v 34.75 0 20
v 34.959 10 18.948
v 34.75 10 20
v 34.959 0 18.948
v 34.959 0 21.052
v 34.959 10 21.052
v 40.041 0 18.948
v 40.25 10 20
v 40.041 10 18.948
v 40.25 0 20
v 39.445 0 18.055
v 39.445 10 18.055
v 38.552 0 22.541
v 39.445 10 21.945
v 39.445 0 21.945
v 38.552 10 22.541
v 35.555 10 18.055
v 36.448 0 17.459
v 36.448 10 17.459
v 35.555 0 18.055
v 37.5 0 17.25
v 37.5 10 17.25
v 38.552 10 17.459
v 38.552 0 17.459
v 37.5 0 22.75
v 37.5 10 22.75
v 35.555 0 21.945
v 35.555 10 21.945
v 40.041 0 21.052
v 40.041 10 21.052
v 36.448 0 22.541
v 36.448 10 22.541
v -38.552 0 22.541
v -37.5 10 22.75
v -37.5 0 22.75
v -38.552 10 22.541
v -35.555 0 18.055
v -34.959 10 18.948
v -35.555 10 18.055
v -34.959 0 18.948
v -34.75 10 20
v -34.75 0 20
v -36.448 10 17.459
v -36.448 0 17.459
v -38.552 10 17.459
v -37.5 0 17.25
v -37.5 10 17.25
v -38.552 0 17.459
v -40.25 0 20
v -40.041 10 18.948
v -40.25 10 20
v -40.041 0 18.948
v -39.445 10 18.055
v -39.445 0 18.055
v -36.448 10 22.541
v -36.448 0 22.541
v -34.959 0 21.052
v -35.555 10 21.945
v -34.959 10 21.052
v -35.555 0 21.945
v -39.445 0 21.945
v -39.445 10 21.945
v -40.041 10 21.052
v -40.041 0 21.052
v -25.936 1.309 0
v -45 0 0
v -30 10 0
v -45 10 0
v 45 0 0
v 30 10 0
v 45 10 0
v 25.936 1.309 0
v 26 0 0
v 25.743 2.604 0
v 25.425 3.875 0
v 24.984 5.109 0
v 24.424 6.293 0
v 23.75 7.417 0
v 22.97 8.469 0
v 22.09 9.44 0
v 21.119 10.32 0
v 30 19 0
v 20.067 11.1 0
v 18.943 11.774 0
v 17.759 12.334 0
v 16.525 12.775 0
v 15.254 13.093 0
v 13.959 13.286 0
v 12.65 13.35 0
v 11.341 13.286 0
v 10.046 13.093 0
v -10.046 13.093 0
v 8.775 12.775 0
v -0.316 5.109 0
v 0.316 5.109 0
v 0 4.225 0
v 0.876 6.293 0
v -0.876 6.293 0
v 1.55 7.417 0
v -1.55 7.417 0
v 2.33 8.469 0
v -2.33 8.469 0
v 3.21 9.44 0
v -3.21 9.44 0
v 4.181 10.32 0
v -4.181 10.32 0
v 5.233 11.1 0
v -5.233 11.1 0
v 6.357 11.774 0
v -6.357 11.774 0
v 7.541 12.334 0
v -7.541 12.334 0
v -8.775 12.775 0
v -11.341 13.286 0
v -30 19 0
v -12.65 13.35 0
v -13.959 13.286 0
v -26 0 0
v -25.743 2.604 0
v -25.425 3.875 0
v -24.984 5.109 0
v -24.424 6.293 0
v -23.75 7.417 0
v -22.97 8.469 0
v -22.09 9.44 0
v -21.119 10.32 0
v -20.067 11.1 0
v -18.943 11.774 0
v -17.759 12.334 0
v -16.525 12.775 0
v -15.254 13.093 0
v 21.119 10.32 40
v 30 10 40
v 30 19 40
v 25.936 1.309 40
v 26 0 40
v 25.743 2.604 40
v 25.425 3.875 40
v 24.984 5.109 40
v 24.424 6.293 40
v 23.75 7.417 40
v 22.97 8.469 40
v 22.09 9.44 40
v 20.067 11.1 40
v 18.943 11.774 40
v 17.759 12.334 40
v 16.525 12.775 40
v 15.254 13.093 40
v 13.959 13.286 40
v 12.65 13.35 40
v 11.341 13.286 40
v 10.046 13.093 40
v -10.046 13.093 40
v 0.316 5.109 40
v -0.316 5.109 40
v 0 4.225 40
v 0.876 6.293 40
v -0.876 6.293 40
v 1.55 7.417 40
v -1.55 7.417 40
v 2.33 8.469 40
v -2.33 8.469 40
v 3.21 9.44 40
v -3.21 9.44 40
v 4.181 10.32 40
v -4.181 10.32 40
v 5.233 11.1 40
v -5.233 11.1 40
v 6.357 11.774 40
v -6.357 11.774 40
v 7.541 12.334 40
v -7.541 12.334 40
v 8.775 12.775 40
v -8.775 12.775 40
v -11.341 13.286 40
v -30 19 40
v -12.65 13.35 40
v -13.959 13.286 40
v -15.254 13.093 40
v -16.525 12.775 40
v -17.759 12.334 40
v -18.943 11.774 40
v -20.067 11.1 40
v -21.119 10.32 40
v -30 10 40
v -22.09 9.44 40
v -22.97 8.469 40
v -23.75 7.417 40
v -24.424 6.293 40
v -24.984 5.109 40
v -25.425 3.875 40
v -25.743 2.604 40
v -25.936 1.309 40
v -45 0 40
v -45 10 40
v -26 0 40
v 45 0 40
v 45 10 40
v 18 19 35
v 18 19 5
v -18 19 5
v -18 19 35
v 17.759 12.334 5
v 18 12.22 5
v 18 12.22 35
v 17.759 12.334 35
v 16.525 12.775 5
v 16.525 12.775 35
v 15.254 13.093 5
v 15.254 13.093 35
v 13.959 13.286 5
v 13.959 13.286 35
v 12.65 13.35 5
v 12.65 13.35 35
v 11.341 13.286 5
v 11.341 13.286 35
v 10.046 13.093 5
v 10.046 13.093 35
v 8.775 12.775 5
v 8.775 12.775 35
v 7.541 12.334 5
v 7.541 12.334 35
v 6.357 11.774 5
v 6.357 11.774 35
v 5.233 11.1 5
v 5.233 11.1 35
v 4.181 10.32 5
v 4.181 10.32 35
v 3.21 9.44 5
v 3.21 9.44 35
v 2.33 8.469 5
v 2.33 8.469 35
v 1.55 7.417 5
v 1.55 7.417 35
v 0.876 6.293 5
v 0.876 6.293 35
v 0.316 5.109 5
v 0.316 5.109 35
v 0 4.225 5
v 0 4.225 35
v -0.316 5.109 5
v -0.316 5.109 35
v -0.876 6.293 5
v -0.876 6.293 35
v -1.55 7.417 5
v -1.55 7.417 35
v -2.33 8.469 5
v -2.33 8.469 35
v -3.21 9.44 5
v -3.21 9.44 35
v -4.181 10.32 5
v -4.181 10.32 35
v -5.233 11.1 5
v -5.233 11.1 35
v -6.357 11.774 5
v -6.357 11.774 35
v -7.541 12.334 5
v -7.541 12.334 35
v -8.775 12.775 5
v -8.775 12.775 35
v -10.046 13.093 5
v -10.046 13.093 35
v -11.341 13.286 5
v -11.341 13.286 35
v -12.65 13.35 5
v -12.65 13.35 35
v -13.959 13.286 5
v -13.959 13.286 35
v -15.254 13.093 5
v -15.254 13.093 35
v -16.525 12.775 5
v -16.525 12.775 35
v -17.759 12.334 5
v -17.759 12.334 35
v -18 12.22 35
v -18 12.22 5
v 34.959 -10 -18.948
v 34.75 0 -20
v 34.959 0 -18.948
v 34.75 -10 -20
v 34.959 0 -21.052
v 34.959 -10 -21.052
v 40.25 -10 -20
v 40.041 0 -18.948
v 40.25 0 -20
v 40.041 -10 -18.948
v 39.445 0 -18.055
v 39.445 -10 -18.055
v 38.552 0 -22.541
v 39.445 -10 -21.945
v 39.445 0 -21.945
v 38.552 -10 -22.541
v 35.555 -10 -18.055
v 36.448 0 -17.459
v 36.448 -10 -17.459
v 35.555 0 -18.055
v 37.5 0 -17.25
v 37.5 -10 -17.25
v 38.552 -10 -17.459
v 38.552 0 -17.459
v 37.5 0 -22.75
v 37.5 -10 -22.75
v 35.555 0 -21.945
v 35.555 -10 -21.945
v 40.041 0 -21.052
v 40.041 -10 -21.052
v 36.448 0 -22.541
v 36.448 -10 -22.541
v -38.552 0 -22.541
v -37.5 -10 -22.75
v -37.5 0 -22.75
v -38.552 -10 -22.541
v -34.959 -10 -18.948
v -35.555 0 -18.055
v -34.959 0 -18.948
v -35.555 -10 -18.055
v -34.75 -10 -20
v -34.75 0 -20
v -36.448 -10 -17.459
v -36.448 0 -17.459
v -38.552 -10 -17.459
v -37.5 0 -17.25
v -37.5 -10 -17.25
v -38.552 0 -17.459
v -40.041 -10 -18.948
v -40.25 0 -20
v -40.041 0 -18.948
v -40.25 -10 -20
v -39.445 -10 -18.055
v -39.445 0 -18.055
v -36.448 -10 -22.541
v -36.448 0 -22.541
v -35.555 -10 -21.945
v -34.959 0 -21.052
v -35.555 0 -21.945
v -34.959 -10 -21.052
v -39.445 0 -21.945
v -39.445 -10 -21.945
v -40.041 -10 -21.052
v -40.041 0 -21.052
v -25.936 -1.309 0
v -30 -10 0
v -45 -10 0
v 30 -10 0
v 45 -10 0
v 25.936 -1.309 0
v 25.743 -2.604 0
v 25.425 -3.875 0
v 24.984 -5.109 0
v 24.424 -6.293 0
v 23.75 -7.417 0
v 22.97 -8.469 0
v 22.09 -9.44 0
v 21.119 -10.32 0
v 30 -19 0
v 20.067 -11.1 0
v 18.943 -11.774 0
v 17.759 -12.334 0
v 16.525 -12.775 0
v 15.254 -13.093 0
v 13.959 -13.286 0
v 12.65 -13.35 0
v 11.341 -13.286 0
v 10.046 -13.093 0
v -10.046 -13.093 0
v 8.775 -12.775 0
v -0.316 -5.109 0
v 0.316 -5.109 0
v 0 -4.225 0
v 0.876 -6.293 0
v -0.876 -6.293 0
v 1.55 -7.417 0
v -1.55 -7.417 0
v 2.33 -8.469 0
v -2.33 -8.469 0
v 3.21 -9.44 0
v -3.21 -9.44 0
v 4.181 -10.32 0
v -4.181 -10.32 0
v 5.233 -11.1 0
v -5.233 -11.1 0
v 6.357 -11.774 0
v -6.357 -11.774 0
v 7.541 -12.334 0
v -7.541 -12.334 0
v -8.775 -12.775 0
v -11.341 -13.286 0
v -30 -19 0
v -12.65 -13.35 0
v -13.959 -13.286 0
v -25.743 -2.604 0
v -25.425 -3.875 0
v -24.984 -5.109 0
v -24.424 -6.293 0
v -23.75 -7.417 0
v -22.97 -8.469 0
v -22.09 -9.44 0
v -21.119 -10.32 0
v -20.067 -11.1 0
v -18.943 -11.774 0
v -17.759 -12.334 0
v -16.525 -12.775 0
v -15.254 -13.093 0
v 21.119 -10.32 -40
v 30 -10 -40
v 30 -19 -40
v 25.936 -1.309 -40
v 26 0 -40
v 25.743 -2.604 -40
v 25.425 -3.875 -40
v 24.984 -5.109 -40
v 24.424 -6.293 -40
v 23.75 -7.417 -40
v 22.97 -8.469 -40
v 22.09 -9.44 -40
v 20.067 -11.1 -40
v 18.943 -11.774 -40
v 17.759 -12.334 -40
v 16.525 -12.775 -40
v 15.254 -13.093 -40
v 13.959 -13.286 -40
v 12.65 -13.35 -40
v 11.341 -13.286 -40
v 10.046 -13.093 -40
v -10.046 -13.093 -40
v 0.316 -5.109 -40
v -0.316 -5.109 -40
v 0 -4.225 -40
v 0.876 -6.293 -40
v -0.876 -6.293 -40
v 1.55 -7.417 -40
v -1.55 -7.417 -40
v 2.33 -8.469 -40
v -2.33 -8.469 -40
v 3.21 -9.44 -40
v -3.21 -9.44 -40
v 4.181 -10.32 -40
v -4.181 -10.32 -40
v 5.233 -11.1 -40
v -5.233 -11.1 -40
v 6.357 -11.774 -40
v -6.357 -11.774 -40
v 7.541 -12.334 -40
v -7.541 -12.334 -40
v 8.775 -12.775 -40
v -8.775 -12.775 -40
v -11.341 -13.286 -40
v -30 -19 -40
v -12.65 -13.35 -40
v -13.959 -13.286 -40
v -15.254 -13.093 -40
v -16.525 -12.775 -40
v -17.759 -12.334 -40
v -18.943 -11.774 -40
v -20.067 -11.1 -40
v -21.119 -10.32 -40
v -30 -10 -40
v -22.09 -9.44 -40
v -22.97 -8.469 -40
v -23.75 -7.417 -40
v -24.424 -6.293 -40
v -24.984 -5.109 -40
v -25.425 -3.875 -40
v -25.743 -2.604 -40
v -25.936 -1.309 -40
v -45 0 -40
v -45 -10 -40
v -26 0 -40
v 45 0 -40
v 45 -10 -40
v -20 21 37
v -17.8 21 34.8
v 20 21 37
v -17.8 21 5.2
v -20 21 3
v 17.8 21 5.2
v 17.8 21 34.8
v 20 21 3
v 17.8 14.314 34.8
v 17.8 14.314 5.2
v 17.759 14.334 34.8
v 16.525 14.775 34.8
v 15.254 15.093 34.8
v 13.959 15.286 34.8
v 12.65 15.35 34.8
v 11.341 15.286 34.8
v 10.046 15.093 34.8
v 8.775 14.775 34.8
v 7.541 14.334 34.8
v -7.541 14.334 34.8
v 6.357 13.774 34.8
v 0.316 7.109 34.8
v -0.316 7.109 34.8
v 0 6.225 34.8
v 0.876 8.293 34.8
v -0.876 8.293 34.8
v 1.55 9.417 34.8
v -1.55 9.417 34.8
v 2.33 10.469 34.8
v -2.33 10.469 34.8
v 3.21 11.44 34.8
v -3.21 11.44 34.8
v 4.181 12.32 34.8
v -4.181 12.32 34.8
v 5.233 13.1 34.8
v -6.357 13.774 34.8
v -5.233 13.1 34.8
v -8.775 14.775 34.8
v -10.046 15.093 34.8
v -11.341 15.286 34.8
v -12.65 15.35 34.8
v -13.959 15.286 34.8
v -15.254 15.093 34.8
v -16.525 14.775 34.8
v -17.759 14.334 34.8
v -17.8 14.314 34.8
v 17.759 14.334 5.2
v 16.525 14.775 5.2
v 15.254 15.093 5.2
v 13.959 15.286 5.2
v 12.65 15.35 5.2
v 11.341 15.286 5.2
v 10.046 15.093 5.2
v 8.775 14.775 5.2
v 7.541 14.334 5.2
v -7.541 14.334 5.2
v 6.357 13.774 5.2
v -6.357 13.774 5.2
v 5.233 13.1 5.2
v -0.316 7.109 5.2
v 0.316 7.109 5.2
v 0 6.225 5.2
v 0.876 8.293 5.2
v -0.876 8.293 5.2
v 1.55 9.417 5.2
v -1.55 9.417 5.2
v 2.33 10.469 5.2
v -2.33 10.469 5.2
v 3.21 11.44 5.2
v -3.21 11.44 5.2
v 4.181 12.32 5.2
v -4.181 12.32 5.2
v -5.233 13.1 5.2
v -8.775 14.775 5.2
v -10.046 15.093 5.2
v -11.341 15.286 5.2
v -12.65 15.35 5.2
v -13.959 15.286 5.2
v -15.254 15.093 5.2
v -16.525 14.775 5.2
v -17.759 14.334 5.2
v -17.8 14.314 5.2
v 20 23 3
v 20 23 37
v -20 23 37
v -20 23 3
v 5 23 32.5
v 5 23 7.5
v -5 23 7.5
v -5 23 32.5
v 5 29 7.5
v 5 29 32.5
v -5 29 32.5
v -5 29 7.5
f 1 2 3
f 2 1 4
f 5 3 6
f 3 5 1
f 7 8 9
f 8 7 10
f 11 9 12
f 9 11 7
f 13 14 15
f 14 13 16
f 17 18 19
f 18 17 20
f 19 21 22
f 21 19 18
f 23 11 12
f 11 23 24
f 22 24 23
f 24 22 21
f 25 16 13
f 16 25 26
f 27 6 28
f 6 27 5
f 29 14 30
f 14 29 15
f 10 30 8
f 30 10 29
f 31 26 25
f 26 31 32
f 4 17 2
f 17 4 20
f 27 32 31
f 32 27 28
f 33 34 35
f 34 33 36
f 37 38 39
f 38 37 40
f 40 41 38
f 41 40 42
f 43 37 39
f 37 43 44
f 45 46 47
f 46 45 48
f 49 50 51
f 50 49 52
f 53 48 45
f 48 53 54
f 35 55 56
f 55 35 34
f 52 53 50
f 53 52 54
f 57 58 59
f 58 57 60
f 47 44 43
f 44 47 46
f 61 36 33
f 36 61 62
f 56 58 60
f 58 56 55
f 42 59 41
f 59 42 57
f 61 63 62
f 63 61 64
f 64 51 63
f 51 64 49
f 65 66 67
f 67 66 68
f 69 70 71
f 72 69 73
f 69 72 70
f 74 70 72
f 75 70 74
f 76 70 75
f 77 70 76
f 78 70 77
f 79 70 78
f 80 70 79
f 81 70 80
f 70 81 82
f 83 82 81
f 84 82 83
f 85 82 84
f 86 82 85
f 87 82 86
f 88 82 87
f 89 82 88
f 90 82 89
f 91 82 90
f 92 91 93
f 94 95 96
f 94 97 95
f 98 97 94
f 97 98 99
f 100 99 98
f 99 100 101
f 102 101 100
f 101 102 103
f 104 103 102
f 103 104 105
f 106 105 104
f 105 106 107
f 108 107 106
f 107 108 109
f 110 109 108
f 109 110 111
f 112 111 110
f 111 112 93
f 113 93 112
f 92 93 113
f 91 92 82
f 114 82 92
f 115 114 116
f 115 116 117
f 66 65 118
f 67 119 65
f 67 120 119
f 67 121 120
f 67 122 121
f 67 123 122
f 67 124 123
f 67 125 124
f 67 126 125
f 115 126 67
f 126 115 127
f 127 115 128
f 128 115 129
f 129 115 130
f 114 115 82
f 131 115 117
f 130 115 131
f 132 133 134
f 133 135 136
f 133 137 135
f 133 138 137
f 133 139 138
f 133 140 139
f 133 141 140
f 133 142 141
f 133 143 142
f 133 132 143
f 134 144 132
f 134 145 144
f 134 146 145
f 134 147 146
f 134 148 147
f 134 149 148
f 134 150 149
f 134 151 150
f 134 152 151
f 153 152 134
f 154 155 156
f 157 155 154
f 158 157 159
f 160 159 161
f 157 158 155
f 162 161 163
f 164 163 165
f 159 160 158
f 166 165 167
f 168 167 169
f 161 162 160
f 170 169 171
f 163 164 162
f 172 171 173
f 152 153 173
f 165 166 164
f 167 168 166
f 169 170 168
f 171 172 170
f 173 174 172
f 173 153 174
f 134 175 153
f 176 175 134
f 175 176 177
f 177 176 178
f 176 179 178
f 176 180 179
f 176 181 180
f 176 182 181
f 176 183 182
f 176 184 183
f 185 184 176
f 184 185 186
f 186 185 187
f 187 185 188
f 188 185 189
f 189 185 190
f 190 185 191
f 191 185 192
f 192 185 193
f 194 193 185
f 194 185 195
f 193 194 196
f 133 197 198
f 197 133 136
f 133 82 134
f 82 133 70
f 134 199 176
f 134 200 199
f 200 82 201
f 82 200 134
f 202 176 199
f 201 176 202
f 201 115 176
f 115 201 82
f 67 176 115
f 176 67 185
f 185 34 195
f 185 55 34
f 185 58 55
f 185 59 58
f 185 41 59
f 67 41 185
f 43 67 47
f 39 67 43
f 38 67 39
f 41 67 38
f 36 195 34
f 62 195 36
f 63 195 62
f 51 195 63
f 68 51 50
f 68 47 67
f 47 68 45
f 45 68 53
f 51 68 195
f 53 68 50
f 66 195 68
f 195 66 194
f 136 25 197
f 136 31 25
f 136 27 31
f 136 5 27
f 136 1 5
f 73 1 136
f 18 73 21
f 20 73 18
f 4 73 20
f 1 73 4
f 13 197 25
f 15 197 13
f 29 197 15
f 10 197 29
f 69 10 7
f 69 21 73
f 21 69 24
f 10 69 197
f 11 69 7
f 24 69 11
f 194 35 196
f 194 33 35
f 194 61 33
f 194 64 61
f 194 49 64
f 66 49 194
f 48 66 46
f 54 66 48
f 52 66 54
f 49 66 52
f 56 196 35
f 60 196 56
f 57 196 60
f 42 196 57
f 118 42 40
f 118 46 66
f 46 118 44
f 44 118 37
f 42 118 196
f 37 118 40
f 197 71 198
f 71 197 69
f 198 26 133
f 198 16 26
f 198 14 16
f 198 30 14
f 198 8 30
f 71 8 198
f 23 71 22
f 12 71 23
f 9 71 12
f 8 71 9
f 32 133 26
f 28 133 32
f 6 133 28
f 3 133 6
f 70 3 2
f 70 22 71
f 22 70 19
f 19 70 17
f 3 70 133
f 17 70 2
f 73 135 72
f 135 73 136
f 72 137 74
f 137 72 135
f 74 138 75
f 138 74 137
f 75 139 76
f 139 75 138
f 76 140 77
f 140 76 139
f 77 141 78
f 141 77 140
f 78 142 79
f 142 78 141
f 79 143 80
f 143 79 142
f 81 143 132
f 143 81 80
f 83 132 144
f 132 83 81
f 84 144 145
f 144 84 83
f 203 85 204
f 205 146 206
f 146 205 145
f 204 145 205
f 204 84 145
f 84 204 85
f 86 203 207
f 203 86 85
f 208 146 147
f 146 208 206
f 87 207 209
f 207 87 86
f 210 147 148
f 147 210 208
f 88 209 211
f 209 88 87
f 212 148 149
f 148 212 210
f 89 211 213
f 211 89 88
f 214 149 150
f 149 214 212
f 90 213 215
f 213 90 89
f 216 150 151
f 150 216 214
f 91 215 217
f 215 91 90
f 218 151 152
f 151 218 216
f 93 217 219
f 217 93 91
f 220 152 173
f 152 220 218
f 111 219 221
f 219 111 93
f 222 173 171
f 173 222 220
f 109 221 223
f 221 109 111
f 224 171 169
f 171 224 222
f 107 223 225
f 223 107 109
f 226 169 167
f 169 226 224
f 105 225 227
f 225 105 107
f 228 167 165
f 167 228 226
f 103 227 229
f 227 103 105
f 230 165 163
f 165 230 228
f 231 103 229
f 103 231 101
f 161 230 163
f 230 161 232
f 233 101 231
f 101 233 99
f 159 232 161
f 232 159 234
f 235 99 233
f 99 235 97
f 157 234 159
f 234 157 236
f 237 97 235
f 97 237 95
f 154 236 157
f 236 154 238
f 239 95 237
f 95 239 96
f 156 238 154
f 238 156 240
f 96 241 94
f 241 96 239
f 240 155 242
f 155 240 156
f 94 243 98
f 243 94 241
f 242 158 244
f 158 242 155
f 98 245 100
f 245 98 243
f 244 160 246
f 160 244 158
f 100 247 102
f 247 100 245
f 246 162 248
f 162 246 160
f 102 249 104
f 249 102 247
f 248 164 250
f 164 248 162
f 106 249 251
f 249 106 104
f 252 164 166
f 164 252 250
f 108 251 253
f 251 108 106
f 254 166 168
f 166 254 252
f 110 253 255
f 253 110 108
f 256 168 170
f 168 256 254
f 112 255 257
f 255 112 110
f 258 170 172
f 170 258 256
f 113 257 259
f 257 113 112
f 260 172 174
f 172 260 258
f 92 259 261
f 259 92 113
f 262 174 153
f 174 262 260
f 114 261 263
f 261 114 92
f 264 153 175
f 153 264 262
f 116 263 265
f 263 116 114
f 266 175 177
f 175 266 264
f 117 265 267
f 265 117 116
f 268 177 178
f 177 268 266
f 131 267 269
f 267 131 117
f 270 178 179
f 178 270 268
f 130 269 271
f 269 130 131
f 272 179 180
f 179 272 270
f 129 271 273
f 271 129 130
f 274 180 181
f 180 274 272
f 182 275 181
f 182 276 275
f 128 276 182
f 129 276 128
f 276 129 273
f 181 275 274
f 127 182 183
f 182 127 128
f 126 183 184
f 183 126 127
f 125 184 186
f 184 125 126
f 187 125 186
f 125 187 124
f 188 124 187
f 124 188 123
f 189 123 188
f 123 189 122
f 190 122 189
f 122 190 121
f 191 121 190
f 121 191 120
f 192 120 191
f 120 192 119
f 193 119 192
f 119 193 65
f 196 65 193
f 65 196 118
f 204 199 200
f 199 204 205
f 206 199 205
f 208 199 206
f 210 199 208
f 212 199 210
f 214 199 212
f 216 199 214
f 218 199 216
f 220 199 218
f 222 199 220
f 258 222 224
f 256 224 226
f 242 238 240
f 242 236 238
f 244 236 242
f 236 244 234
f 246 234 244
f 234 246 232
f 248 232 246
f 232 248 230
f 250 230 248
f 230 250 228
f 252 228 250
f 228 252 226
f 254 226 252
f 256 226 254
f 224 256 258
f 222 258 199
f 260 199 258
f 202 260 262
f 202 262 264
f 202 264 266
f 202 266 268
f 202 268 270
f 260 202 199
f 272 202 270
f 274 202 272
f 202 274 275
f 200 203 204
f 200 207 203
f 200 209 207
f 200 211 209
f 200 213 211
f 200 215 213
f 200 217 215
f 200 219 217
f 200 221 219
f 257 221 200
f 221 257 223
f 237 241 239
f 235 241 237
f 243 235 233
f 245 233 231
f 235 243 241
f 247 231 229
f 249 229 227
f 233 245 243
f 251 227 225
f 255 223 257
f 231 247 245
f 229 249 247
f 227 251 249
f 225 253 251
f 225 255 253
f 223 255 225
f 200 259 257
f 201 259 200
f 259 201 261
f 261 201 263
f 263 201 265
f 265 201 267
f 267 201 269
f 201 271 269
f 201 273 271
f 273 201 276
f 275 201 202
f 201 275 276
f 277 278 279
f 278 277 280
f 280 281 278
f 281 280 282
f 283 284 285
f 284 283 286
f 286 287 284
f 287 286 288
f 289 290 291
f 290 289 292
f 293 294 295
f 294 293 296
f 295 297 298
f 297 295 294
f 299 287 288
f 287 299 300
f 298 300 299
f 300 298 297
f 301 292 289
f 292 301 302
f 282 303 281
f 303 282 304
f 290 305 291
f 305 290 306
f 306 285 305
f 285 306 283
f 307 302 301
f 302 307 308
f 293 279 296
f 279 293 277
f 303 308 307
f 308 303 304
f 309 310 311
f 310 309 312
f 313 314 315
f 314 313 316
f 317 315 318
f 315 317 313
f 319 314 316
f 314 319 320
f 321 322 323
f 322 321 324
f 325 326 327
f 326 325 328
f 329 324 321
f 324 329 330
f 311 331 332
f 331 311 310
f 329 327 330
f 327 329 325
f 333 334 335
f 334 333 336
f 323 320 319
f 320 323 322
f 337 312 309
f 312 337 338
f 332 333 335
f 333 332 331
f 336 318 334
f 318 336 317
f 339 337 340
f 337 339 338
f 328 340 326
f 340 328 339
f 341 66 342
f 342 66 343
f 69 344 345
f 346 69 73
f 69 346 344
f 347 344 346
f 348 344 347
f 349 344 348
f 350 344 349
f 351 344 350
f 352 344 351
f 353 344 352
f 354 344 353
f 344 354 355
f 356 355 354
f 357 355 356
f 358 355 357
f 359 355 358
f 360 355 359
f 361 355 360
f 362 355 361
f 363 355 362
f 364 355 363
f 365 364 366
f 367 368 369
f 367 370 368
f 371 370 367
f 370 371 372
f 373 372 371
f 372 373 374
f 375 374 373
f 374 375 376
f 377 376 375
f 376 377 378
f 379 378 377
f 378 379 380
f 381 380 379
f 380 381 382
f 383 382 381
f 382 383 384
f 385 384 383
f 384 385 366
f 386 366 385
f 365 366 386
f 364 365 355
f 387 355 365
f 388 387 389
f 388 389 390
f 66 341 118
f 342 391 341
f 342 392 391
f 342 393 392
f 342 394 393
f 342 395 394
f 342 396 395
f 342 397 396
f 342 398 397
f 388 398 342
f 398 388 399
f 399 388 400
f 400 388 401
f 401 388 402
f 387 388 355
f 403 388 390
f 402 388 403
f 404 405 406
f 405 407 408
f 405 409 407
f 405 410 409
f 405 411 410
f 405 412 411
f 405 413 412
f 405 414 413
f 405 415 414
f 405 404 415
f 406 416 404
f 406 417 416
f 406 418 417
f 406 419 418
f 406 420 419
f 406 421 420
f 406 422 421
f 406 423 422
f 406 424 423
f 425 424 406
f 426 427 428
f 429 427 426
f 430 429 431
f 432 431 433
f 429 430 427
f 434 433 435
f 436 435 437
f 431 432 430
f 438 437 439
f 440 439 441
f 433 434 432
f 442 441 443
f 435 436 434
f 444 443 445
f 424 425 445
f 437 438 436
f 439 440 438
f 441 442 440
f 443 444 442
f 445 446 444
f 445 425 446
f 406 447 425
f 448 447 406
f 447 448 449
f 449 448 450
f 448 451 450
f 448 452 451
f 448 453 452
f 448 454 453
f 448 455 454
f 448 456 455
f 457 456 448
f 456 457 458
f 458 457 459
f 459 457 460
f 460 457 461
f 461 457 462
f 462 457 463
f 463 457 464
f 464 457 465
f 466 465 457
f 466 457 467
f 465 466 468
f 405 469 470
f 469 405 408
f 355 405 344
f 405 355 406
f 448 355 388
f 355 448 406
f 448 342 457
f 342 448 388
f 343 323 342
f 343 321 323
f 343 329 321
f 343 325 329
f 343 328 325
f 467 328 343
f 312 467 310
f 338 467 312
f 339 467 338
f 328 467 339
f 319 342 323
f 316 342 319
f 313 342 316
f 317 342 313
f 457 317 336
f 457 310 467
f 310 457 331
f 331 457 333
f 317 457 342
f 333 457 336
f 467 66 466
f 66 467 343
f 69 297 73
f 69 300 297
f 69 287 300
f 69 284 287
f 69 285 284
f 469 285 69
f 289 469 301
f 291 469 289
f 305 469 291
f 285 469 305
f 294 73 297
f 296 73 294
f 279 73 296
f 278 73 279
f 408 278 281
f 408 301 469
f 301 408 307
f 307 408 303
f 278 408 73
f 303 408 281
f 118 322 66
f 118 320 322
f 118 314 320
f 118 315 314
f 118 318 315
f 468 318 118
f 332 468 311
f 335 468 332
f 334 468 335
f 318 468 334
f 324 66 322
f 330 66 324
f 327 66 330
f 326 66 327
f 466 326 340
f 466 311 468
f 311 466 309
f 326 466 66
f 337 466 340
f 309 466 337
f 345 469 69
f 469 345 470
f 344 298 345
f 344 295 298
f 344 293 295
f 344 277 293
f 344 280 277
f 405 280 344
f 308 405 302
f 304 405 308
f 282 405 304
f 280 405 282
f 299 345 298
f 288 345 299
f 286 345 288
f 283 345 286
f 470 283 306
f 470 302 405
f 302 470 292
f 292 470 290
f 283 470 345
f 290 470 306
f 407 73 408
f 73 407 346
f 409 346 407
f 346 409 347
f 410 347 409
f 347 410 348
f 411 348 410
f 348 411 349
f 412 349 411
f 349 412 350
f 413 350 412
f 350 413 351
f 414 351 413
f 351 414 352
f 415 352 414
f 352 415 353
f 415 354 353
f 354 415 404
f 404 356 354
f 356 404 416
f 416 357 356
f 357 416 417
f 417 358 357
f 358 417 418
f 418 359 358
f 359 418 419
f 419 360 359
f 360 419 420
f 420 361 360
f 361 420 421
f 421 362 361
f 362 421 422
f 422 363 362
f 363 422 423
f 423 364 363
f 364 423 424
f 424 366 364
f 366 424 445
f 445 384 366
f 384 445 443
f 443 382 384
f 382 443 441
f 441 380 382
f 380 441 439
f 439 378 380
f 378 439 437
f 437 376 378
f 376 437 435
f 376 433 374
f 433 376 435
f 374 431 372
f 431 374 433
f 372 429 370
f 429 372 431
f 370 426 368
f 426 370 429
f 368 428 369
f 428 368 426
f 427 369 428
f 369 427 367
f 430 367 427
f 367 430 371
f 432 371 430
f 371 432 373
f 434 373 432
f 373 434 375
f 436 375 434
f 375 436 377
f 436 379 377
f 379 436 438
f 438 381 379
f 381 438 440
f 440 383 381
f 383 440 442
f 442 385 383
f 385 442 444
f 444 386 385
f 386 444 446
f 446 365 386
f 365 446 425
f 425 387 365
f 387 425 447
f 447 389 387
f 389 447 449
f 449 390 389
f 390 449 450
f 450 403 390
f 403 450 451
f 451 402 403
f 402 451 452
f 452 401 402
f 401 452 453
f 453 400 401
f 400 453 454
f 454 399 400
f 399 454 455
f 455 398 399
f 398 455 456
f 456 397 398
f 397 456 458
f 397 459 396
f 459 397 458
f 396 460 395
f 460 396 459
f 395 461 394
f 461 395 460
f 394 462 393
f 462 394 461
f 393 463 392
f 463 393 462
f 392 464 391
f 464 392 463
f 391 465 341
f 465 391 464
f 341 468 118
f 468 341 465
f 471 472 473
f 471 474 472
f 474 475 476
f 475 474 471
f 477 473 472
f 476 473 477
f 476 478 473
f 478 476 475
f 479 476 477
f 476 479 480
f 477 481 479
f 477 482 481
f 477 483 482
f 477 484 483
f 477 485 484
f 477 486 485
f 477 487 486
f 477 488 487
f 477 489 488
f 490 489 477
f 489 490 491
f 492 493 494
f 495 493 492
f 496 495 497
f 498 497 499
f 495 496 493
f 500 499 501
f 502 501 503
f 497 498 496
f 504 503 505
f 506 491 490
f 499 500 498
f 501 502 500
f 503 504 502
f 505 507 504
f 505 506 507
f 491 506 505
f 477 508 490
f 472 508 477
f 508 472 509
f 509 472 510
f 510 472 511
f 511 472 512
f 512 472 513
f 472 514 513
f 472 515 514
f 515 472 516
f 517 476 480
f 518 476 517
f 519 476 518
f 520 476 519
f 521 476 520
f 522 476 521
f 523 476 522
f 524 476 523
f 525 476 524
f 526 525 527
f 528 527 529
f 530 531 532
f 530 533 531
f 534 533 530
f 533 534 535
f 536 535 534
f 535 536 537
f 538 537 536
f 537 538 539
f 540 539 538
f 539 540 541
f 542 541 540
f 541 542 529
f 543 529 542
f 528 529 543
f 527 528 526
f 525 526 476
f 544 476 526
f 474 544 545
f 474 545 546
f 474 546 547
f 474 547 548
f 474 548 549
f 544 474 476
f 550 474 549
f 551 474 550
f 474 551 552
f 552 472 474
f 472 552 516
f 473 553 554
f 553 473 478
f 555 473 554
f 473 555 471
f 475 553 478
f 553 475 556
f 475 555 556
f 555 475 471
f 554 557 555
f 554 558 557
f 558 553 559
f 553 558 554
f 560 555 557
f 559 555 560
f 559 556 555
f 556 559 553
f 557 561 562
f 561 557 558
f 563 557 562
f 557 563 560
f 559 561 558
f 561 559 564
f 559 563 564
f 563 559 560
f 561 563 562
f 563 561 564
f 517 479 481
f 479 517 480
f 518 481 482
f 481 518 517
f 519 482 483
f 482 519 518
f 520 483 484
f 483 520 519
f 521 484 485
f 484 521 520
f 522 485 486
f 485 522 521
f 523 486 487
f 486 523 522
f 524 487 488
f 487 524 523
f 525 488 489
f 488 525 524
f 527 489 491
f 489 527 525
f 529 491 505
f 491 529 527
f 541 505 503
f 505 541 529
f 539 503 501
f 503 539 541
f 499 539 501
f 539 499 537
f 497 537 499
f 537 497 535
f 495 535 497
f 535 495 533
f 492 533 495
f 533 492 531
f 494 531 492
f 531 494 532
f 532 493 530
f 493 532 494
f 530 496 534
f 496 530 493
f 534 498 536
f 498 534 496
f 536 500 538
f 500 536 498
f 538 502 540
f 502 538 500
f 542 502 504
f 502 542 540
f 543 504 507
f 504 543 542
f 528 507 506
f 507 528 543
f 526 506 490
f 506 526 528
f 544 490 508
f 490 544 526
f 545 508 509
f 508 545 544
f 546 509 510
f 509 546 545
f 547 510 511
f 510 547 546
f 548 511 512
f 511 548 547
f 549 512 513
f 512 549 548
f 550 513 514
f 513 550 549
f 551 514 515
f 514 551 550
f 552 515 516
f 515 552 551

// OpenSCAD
/* ==========================================================
   MINI-BARRIL CALIBRADOR (TEST DE TOLERANCIA) - V5.4
   ----------------------------------------------------------
   - FIX: Corte profundo de escotilla corregido.
   - NUEVO: Tapón de escotilla (mini_hatch) extraíble con 
     curvatura interior exacta y agarradera.
   ========================================================== */

part = "assembly"; // [test_TOP, test_BOTTOM, test_HATCH, assembly]

/* --- PARÁMETROS PRINCIPALES --- */
test_length = 40;        
ver_interior = true;     

/* --- PARÁMETROS EXACTOS DEL BARRIL --- */
cdist = 25.3;            
r_bore = 13.0;           
bore_comp = 0.35;        

/* --- PARÁMETROS DE OPTIMIZACIÓN (Recortes) --- */
wall_t = 6.0;            
total_w = 90;            

cut_w = 15;              
cut_h = 9;               

/* --- CÁLCULOS INTERNOS AUTOMÁTICOS --- */
total_h = r_bore + wall_t;       
flange_h = total_h - cut_h;      
body_w = total_w - (2 * cut_w);  
bolt_x = (total_w / 2) - 7.5;    

/* ==========================================================
   MÓDULOS 
   ========================================================== */
module bore_2d() {
    union() {
        translate([-cdist/2, 0]) circle(r=r_bore + bore_comp, $fn=64);
        translate([cdist/2, 0]) circle(r=r_bore + bore_comp, $fn=64);
    }
}

module outer_profile() {
    difference() {
        translate([-total_w/2, 0]) square([total_w, total_h]);
        translate([-total_w/2, total_h - cut_h]) square([cut_w, cut_h + 1]);
        translate([total_w/2 - cut_w, total_h - cut_h]) square([cut_w, cut_h + 1]);
    }
}

module mini_barrel(is_top=true) {
    difference() {
        linear_extrude(test_length) outer_profile();
        
        // Hueco interior en Figura de 8
        translate([0,0,-1]) linear_extrude(test_length+2) bore_2d();
        
        // Agujeros M5 
        if (test_length > 40) {
            for (z = [10, test_length - 10]) {
                translate([bolt_x, -1, z]) rotate([-90,0,0]) cylinder(d=5.5, h=flange_h+2, $fn=16);
                translate([-bolt_x, -1, z]) rotate([-90,0,0]) cylinder(d=5.5, h=flange_h+2, $fn=16);
            }
        } else {
            translate([bolt_x, -1, test_length/2]) rotate([-90,0,0]) cylinder(d=5.5, h=flange_h+2, $fn=16);
            translate([-bolt_x, -1, test_length/2]) rotate([-90,0,0]) cylinder(d=5.5, h=flange_h+2, $fn=16);
        }
        
        // CORTE DE LA VENTANA
        if (is_top && ver_interior) {
            window_len = max(5, test_length - 10);
            translate([0, r_bore, test_length/2])
            cube([36, 40, window_len], center=true);
        }
    }
}

/* --- NUEVO MÓDULO: EL TAPÓN DE INSPECCIÓN --- */
module mini_hatch() {
    window_len = max(5, test_length - 10);
    
    difference() {
        union() {
            // 1. Cuerpo del tapón (Intersección del perfil exterior con el hueco)
            // Se le resta 0.4 mm para garantizar que entre suavemente (Clearance)
            intersection() {
                linear_extrude(test_length) outer_profile();
                translate([0, r_bore, test_length/2])
                cube([35.6, 40, window_len - 0.4], center=true);
            }
            
            // 2. Pestaña de tope (Para que no caiga hacia los tornillos)
            translate([0, total_h + 1, test_length/2])
            cube([40, 2, window_len + 4], center=true);
            
            // 3. Agarradera / Manija
            translate([0, total_h + 5, test_length/2])
            cube([10, 6, window_len - 5], center=true);
        }
        
        // 4. EL CORTE MÁGICO: Le restamos el Bore para que copie la curva de los tornillos
        translate([0,0,-1]) linear_extrude(test_length+2) bore_2d();
    }
}

/* ==========================================================
   VISTA Y SELECCIÓN DE PIEZAS
   ========================================================== */
if (part == "assembly") {
    color("lightgreen", 0.8) mini_barrel(is_top=true);
    color("darkgreen", 0.8)  rotate([180,0,0]) mini_barrel(is_top=false);
    
    // Mostramos el tapón ligeramente levantado para que se note
    color("cyan") translate([0, 2, 0]) mini_hatch();
} 
else if (part == "test_TOP") {
    rotate([-90, 0, 0]) mini_barrel(is_top=true);
}
else if (part == "test_BOTTOM") {
    rotate([-90, 0, 0]) mini_barrel(is_top=false);
}
else if (part == "test_HATCH") {
    // Se exporta acostado, igual que el barril, para que la curva interior 
    // se imprima con resolución perfecta.
    rotate([-90, 0, 0]) mini_hatch();
}
